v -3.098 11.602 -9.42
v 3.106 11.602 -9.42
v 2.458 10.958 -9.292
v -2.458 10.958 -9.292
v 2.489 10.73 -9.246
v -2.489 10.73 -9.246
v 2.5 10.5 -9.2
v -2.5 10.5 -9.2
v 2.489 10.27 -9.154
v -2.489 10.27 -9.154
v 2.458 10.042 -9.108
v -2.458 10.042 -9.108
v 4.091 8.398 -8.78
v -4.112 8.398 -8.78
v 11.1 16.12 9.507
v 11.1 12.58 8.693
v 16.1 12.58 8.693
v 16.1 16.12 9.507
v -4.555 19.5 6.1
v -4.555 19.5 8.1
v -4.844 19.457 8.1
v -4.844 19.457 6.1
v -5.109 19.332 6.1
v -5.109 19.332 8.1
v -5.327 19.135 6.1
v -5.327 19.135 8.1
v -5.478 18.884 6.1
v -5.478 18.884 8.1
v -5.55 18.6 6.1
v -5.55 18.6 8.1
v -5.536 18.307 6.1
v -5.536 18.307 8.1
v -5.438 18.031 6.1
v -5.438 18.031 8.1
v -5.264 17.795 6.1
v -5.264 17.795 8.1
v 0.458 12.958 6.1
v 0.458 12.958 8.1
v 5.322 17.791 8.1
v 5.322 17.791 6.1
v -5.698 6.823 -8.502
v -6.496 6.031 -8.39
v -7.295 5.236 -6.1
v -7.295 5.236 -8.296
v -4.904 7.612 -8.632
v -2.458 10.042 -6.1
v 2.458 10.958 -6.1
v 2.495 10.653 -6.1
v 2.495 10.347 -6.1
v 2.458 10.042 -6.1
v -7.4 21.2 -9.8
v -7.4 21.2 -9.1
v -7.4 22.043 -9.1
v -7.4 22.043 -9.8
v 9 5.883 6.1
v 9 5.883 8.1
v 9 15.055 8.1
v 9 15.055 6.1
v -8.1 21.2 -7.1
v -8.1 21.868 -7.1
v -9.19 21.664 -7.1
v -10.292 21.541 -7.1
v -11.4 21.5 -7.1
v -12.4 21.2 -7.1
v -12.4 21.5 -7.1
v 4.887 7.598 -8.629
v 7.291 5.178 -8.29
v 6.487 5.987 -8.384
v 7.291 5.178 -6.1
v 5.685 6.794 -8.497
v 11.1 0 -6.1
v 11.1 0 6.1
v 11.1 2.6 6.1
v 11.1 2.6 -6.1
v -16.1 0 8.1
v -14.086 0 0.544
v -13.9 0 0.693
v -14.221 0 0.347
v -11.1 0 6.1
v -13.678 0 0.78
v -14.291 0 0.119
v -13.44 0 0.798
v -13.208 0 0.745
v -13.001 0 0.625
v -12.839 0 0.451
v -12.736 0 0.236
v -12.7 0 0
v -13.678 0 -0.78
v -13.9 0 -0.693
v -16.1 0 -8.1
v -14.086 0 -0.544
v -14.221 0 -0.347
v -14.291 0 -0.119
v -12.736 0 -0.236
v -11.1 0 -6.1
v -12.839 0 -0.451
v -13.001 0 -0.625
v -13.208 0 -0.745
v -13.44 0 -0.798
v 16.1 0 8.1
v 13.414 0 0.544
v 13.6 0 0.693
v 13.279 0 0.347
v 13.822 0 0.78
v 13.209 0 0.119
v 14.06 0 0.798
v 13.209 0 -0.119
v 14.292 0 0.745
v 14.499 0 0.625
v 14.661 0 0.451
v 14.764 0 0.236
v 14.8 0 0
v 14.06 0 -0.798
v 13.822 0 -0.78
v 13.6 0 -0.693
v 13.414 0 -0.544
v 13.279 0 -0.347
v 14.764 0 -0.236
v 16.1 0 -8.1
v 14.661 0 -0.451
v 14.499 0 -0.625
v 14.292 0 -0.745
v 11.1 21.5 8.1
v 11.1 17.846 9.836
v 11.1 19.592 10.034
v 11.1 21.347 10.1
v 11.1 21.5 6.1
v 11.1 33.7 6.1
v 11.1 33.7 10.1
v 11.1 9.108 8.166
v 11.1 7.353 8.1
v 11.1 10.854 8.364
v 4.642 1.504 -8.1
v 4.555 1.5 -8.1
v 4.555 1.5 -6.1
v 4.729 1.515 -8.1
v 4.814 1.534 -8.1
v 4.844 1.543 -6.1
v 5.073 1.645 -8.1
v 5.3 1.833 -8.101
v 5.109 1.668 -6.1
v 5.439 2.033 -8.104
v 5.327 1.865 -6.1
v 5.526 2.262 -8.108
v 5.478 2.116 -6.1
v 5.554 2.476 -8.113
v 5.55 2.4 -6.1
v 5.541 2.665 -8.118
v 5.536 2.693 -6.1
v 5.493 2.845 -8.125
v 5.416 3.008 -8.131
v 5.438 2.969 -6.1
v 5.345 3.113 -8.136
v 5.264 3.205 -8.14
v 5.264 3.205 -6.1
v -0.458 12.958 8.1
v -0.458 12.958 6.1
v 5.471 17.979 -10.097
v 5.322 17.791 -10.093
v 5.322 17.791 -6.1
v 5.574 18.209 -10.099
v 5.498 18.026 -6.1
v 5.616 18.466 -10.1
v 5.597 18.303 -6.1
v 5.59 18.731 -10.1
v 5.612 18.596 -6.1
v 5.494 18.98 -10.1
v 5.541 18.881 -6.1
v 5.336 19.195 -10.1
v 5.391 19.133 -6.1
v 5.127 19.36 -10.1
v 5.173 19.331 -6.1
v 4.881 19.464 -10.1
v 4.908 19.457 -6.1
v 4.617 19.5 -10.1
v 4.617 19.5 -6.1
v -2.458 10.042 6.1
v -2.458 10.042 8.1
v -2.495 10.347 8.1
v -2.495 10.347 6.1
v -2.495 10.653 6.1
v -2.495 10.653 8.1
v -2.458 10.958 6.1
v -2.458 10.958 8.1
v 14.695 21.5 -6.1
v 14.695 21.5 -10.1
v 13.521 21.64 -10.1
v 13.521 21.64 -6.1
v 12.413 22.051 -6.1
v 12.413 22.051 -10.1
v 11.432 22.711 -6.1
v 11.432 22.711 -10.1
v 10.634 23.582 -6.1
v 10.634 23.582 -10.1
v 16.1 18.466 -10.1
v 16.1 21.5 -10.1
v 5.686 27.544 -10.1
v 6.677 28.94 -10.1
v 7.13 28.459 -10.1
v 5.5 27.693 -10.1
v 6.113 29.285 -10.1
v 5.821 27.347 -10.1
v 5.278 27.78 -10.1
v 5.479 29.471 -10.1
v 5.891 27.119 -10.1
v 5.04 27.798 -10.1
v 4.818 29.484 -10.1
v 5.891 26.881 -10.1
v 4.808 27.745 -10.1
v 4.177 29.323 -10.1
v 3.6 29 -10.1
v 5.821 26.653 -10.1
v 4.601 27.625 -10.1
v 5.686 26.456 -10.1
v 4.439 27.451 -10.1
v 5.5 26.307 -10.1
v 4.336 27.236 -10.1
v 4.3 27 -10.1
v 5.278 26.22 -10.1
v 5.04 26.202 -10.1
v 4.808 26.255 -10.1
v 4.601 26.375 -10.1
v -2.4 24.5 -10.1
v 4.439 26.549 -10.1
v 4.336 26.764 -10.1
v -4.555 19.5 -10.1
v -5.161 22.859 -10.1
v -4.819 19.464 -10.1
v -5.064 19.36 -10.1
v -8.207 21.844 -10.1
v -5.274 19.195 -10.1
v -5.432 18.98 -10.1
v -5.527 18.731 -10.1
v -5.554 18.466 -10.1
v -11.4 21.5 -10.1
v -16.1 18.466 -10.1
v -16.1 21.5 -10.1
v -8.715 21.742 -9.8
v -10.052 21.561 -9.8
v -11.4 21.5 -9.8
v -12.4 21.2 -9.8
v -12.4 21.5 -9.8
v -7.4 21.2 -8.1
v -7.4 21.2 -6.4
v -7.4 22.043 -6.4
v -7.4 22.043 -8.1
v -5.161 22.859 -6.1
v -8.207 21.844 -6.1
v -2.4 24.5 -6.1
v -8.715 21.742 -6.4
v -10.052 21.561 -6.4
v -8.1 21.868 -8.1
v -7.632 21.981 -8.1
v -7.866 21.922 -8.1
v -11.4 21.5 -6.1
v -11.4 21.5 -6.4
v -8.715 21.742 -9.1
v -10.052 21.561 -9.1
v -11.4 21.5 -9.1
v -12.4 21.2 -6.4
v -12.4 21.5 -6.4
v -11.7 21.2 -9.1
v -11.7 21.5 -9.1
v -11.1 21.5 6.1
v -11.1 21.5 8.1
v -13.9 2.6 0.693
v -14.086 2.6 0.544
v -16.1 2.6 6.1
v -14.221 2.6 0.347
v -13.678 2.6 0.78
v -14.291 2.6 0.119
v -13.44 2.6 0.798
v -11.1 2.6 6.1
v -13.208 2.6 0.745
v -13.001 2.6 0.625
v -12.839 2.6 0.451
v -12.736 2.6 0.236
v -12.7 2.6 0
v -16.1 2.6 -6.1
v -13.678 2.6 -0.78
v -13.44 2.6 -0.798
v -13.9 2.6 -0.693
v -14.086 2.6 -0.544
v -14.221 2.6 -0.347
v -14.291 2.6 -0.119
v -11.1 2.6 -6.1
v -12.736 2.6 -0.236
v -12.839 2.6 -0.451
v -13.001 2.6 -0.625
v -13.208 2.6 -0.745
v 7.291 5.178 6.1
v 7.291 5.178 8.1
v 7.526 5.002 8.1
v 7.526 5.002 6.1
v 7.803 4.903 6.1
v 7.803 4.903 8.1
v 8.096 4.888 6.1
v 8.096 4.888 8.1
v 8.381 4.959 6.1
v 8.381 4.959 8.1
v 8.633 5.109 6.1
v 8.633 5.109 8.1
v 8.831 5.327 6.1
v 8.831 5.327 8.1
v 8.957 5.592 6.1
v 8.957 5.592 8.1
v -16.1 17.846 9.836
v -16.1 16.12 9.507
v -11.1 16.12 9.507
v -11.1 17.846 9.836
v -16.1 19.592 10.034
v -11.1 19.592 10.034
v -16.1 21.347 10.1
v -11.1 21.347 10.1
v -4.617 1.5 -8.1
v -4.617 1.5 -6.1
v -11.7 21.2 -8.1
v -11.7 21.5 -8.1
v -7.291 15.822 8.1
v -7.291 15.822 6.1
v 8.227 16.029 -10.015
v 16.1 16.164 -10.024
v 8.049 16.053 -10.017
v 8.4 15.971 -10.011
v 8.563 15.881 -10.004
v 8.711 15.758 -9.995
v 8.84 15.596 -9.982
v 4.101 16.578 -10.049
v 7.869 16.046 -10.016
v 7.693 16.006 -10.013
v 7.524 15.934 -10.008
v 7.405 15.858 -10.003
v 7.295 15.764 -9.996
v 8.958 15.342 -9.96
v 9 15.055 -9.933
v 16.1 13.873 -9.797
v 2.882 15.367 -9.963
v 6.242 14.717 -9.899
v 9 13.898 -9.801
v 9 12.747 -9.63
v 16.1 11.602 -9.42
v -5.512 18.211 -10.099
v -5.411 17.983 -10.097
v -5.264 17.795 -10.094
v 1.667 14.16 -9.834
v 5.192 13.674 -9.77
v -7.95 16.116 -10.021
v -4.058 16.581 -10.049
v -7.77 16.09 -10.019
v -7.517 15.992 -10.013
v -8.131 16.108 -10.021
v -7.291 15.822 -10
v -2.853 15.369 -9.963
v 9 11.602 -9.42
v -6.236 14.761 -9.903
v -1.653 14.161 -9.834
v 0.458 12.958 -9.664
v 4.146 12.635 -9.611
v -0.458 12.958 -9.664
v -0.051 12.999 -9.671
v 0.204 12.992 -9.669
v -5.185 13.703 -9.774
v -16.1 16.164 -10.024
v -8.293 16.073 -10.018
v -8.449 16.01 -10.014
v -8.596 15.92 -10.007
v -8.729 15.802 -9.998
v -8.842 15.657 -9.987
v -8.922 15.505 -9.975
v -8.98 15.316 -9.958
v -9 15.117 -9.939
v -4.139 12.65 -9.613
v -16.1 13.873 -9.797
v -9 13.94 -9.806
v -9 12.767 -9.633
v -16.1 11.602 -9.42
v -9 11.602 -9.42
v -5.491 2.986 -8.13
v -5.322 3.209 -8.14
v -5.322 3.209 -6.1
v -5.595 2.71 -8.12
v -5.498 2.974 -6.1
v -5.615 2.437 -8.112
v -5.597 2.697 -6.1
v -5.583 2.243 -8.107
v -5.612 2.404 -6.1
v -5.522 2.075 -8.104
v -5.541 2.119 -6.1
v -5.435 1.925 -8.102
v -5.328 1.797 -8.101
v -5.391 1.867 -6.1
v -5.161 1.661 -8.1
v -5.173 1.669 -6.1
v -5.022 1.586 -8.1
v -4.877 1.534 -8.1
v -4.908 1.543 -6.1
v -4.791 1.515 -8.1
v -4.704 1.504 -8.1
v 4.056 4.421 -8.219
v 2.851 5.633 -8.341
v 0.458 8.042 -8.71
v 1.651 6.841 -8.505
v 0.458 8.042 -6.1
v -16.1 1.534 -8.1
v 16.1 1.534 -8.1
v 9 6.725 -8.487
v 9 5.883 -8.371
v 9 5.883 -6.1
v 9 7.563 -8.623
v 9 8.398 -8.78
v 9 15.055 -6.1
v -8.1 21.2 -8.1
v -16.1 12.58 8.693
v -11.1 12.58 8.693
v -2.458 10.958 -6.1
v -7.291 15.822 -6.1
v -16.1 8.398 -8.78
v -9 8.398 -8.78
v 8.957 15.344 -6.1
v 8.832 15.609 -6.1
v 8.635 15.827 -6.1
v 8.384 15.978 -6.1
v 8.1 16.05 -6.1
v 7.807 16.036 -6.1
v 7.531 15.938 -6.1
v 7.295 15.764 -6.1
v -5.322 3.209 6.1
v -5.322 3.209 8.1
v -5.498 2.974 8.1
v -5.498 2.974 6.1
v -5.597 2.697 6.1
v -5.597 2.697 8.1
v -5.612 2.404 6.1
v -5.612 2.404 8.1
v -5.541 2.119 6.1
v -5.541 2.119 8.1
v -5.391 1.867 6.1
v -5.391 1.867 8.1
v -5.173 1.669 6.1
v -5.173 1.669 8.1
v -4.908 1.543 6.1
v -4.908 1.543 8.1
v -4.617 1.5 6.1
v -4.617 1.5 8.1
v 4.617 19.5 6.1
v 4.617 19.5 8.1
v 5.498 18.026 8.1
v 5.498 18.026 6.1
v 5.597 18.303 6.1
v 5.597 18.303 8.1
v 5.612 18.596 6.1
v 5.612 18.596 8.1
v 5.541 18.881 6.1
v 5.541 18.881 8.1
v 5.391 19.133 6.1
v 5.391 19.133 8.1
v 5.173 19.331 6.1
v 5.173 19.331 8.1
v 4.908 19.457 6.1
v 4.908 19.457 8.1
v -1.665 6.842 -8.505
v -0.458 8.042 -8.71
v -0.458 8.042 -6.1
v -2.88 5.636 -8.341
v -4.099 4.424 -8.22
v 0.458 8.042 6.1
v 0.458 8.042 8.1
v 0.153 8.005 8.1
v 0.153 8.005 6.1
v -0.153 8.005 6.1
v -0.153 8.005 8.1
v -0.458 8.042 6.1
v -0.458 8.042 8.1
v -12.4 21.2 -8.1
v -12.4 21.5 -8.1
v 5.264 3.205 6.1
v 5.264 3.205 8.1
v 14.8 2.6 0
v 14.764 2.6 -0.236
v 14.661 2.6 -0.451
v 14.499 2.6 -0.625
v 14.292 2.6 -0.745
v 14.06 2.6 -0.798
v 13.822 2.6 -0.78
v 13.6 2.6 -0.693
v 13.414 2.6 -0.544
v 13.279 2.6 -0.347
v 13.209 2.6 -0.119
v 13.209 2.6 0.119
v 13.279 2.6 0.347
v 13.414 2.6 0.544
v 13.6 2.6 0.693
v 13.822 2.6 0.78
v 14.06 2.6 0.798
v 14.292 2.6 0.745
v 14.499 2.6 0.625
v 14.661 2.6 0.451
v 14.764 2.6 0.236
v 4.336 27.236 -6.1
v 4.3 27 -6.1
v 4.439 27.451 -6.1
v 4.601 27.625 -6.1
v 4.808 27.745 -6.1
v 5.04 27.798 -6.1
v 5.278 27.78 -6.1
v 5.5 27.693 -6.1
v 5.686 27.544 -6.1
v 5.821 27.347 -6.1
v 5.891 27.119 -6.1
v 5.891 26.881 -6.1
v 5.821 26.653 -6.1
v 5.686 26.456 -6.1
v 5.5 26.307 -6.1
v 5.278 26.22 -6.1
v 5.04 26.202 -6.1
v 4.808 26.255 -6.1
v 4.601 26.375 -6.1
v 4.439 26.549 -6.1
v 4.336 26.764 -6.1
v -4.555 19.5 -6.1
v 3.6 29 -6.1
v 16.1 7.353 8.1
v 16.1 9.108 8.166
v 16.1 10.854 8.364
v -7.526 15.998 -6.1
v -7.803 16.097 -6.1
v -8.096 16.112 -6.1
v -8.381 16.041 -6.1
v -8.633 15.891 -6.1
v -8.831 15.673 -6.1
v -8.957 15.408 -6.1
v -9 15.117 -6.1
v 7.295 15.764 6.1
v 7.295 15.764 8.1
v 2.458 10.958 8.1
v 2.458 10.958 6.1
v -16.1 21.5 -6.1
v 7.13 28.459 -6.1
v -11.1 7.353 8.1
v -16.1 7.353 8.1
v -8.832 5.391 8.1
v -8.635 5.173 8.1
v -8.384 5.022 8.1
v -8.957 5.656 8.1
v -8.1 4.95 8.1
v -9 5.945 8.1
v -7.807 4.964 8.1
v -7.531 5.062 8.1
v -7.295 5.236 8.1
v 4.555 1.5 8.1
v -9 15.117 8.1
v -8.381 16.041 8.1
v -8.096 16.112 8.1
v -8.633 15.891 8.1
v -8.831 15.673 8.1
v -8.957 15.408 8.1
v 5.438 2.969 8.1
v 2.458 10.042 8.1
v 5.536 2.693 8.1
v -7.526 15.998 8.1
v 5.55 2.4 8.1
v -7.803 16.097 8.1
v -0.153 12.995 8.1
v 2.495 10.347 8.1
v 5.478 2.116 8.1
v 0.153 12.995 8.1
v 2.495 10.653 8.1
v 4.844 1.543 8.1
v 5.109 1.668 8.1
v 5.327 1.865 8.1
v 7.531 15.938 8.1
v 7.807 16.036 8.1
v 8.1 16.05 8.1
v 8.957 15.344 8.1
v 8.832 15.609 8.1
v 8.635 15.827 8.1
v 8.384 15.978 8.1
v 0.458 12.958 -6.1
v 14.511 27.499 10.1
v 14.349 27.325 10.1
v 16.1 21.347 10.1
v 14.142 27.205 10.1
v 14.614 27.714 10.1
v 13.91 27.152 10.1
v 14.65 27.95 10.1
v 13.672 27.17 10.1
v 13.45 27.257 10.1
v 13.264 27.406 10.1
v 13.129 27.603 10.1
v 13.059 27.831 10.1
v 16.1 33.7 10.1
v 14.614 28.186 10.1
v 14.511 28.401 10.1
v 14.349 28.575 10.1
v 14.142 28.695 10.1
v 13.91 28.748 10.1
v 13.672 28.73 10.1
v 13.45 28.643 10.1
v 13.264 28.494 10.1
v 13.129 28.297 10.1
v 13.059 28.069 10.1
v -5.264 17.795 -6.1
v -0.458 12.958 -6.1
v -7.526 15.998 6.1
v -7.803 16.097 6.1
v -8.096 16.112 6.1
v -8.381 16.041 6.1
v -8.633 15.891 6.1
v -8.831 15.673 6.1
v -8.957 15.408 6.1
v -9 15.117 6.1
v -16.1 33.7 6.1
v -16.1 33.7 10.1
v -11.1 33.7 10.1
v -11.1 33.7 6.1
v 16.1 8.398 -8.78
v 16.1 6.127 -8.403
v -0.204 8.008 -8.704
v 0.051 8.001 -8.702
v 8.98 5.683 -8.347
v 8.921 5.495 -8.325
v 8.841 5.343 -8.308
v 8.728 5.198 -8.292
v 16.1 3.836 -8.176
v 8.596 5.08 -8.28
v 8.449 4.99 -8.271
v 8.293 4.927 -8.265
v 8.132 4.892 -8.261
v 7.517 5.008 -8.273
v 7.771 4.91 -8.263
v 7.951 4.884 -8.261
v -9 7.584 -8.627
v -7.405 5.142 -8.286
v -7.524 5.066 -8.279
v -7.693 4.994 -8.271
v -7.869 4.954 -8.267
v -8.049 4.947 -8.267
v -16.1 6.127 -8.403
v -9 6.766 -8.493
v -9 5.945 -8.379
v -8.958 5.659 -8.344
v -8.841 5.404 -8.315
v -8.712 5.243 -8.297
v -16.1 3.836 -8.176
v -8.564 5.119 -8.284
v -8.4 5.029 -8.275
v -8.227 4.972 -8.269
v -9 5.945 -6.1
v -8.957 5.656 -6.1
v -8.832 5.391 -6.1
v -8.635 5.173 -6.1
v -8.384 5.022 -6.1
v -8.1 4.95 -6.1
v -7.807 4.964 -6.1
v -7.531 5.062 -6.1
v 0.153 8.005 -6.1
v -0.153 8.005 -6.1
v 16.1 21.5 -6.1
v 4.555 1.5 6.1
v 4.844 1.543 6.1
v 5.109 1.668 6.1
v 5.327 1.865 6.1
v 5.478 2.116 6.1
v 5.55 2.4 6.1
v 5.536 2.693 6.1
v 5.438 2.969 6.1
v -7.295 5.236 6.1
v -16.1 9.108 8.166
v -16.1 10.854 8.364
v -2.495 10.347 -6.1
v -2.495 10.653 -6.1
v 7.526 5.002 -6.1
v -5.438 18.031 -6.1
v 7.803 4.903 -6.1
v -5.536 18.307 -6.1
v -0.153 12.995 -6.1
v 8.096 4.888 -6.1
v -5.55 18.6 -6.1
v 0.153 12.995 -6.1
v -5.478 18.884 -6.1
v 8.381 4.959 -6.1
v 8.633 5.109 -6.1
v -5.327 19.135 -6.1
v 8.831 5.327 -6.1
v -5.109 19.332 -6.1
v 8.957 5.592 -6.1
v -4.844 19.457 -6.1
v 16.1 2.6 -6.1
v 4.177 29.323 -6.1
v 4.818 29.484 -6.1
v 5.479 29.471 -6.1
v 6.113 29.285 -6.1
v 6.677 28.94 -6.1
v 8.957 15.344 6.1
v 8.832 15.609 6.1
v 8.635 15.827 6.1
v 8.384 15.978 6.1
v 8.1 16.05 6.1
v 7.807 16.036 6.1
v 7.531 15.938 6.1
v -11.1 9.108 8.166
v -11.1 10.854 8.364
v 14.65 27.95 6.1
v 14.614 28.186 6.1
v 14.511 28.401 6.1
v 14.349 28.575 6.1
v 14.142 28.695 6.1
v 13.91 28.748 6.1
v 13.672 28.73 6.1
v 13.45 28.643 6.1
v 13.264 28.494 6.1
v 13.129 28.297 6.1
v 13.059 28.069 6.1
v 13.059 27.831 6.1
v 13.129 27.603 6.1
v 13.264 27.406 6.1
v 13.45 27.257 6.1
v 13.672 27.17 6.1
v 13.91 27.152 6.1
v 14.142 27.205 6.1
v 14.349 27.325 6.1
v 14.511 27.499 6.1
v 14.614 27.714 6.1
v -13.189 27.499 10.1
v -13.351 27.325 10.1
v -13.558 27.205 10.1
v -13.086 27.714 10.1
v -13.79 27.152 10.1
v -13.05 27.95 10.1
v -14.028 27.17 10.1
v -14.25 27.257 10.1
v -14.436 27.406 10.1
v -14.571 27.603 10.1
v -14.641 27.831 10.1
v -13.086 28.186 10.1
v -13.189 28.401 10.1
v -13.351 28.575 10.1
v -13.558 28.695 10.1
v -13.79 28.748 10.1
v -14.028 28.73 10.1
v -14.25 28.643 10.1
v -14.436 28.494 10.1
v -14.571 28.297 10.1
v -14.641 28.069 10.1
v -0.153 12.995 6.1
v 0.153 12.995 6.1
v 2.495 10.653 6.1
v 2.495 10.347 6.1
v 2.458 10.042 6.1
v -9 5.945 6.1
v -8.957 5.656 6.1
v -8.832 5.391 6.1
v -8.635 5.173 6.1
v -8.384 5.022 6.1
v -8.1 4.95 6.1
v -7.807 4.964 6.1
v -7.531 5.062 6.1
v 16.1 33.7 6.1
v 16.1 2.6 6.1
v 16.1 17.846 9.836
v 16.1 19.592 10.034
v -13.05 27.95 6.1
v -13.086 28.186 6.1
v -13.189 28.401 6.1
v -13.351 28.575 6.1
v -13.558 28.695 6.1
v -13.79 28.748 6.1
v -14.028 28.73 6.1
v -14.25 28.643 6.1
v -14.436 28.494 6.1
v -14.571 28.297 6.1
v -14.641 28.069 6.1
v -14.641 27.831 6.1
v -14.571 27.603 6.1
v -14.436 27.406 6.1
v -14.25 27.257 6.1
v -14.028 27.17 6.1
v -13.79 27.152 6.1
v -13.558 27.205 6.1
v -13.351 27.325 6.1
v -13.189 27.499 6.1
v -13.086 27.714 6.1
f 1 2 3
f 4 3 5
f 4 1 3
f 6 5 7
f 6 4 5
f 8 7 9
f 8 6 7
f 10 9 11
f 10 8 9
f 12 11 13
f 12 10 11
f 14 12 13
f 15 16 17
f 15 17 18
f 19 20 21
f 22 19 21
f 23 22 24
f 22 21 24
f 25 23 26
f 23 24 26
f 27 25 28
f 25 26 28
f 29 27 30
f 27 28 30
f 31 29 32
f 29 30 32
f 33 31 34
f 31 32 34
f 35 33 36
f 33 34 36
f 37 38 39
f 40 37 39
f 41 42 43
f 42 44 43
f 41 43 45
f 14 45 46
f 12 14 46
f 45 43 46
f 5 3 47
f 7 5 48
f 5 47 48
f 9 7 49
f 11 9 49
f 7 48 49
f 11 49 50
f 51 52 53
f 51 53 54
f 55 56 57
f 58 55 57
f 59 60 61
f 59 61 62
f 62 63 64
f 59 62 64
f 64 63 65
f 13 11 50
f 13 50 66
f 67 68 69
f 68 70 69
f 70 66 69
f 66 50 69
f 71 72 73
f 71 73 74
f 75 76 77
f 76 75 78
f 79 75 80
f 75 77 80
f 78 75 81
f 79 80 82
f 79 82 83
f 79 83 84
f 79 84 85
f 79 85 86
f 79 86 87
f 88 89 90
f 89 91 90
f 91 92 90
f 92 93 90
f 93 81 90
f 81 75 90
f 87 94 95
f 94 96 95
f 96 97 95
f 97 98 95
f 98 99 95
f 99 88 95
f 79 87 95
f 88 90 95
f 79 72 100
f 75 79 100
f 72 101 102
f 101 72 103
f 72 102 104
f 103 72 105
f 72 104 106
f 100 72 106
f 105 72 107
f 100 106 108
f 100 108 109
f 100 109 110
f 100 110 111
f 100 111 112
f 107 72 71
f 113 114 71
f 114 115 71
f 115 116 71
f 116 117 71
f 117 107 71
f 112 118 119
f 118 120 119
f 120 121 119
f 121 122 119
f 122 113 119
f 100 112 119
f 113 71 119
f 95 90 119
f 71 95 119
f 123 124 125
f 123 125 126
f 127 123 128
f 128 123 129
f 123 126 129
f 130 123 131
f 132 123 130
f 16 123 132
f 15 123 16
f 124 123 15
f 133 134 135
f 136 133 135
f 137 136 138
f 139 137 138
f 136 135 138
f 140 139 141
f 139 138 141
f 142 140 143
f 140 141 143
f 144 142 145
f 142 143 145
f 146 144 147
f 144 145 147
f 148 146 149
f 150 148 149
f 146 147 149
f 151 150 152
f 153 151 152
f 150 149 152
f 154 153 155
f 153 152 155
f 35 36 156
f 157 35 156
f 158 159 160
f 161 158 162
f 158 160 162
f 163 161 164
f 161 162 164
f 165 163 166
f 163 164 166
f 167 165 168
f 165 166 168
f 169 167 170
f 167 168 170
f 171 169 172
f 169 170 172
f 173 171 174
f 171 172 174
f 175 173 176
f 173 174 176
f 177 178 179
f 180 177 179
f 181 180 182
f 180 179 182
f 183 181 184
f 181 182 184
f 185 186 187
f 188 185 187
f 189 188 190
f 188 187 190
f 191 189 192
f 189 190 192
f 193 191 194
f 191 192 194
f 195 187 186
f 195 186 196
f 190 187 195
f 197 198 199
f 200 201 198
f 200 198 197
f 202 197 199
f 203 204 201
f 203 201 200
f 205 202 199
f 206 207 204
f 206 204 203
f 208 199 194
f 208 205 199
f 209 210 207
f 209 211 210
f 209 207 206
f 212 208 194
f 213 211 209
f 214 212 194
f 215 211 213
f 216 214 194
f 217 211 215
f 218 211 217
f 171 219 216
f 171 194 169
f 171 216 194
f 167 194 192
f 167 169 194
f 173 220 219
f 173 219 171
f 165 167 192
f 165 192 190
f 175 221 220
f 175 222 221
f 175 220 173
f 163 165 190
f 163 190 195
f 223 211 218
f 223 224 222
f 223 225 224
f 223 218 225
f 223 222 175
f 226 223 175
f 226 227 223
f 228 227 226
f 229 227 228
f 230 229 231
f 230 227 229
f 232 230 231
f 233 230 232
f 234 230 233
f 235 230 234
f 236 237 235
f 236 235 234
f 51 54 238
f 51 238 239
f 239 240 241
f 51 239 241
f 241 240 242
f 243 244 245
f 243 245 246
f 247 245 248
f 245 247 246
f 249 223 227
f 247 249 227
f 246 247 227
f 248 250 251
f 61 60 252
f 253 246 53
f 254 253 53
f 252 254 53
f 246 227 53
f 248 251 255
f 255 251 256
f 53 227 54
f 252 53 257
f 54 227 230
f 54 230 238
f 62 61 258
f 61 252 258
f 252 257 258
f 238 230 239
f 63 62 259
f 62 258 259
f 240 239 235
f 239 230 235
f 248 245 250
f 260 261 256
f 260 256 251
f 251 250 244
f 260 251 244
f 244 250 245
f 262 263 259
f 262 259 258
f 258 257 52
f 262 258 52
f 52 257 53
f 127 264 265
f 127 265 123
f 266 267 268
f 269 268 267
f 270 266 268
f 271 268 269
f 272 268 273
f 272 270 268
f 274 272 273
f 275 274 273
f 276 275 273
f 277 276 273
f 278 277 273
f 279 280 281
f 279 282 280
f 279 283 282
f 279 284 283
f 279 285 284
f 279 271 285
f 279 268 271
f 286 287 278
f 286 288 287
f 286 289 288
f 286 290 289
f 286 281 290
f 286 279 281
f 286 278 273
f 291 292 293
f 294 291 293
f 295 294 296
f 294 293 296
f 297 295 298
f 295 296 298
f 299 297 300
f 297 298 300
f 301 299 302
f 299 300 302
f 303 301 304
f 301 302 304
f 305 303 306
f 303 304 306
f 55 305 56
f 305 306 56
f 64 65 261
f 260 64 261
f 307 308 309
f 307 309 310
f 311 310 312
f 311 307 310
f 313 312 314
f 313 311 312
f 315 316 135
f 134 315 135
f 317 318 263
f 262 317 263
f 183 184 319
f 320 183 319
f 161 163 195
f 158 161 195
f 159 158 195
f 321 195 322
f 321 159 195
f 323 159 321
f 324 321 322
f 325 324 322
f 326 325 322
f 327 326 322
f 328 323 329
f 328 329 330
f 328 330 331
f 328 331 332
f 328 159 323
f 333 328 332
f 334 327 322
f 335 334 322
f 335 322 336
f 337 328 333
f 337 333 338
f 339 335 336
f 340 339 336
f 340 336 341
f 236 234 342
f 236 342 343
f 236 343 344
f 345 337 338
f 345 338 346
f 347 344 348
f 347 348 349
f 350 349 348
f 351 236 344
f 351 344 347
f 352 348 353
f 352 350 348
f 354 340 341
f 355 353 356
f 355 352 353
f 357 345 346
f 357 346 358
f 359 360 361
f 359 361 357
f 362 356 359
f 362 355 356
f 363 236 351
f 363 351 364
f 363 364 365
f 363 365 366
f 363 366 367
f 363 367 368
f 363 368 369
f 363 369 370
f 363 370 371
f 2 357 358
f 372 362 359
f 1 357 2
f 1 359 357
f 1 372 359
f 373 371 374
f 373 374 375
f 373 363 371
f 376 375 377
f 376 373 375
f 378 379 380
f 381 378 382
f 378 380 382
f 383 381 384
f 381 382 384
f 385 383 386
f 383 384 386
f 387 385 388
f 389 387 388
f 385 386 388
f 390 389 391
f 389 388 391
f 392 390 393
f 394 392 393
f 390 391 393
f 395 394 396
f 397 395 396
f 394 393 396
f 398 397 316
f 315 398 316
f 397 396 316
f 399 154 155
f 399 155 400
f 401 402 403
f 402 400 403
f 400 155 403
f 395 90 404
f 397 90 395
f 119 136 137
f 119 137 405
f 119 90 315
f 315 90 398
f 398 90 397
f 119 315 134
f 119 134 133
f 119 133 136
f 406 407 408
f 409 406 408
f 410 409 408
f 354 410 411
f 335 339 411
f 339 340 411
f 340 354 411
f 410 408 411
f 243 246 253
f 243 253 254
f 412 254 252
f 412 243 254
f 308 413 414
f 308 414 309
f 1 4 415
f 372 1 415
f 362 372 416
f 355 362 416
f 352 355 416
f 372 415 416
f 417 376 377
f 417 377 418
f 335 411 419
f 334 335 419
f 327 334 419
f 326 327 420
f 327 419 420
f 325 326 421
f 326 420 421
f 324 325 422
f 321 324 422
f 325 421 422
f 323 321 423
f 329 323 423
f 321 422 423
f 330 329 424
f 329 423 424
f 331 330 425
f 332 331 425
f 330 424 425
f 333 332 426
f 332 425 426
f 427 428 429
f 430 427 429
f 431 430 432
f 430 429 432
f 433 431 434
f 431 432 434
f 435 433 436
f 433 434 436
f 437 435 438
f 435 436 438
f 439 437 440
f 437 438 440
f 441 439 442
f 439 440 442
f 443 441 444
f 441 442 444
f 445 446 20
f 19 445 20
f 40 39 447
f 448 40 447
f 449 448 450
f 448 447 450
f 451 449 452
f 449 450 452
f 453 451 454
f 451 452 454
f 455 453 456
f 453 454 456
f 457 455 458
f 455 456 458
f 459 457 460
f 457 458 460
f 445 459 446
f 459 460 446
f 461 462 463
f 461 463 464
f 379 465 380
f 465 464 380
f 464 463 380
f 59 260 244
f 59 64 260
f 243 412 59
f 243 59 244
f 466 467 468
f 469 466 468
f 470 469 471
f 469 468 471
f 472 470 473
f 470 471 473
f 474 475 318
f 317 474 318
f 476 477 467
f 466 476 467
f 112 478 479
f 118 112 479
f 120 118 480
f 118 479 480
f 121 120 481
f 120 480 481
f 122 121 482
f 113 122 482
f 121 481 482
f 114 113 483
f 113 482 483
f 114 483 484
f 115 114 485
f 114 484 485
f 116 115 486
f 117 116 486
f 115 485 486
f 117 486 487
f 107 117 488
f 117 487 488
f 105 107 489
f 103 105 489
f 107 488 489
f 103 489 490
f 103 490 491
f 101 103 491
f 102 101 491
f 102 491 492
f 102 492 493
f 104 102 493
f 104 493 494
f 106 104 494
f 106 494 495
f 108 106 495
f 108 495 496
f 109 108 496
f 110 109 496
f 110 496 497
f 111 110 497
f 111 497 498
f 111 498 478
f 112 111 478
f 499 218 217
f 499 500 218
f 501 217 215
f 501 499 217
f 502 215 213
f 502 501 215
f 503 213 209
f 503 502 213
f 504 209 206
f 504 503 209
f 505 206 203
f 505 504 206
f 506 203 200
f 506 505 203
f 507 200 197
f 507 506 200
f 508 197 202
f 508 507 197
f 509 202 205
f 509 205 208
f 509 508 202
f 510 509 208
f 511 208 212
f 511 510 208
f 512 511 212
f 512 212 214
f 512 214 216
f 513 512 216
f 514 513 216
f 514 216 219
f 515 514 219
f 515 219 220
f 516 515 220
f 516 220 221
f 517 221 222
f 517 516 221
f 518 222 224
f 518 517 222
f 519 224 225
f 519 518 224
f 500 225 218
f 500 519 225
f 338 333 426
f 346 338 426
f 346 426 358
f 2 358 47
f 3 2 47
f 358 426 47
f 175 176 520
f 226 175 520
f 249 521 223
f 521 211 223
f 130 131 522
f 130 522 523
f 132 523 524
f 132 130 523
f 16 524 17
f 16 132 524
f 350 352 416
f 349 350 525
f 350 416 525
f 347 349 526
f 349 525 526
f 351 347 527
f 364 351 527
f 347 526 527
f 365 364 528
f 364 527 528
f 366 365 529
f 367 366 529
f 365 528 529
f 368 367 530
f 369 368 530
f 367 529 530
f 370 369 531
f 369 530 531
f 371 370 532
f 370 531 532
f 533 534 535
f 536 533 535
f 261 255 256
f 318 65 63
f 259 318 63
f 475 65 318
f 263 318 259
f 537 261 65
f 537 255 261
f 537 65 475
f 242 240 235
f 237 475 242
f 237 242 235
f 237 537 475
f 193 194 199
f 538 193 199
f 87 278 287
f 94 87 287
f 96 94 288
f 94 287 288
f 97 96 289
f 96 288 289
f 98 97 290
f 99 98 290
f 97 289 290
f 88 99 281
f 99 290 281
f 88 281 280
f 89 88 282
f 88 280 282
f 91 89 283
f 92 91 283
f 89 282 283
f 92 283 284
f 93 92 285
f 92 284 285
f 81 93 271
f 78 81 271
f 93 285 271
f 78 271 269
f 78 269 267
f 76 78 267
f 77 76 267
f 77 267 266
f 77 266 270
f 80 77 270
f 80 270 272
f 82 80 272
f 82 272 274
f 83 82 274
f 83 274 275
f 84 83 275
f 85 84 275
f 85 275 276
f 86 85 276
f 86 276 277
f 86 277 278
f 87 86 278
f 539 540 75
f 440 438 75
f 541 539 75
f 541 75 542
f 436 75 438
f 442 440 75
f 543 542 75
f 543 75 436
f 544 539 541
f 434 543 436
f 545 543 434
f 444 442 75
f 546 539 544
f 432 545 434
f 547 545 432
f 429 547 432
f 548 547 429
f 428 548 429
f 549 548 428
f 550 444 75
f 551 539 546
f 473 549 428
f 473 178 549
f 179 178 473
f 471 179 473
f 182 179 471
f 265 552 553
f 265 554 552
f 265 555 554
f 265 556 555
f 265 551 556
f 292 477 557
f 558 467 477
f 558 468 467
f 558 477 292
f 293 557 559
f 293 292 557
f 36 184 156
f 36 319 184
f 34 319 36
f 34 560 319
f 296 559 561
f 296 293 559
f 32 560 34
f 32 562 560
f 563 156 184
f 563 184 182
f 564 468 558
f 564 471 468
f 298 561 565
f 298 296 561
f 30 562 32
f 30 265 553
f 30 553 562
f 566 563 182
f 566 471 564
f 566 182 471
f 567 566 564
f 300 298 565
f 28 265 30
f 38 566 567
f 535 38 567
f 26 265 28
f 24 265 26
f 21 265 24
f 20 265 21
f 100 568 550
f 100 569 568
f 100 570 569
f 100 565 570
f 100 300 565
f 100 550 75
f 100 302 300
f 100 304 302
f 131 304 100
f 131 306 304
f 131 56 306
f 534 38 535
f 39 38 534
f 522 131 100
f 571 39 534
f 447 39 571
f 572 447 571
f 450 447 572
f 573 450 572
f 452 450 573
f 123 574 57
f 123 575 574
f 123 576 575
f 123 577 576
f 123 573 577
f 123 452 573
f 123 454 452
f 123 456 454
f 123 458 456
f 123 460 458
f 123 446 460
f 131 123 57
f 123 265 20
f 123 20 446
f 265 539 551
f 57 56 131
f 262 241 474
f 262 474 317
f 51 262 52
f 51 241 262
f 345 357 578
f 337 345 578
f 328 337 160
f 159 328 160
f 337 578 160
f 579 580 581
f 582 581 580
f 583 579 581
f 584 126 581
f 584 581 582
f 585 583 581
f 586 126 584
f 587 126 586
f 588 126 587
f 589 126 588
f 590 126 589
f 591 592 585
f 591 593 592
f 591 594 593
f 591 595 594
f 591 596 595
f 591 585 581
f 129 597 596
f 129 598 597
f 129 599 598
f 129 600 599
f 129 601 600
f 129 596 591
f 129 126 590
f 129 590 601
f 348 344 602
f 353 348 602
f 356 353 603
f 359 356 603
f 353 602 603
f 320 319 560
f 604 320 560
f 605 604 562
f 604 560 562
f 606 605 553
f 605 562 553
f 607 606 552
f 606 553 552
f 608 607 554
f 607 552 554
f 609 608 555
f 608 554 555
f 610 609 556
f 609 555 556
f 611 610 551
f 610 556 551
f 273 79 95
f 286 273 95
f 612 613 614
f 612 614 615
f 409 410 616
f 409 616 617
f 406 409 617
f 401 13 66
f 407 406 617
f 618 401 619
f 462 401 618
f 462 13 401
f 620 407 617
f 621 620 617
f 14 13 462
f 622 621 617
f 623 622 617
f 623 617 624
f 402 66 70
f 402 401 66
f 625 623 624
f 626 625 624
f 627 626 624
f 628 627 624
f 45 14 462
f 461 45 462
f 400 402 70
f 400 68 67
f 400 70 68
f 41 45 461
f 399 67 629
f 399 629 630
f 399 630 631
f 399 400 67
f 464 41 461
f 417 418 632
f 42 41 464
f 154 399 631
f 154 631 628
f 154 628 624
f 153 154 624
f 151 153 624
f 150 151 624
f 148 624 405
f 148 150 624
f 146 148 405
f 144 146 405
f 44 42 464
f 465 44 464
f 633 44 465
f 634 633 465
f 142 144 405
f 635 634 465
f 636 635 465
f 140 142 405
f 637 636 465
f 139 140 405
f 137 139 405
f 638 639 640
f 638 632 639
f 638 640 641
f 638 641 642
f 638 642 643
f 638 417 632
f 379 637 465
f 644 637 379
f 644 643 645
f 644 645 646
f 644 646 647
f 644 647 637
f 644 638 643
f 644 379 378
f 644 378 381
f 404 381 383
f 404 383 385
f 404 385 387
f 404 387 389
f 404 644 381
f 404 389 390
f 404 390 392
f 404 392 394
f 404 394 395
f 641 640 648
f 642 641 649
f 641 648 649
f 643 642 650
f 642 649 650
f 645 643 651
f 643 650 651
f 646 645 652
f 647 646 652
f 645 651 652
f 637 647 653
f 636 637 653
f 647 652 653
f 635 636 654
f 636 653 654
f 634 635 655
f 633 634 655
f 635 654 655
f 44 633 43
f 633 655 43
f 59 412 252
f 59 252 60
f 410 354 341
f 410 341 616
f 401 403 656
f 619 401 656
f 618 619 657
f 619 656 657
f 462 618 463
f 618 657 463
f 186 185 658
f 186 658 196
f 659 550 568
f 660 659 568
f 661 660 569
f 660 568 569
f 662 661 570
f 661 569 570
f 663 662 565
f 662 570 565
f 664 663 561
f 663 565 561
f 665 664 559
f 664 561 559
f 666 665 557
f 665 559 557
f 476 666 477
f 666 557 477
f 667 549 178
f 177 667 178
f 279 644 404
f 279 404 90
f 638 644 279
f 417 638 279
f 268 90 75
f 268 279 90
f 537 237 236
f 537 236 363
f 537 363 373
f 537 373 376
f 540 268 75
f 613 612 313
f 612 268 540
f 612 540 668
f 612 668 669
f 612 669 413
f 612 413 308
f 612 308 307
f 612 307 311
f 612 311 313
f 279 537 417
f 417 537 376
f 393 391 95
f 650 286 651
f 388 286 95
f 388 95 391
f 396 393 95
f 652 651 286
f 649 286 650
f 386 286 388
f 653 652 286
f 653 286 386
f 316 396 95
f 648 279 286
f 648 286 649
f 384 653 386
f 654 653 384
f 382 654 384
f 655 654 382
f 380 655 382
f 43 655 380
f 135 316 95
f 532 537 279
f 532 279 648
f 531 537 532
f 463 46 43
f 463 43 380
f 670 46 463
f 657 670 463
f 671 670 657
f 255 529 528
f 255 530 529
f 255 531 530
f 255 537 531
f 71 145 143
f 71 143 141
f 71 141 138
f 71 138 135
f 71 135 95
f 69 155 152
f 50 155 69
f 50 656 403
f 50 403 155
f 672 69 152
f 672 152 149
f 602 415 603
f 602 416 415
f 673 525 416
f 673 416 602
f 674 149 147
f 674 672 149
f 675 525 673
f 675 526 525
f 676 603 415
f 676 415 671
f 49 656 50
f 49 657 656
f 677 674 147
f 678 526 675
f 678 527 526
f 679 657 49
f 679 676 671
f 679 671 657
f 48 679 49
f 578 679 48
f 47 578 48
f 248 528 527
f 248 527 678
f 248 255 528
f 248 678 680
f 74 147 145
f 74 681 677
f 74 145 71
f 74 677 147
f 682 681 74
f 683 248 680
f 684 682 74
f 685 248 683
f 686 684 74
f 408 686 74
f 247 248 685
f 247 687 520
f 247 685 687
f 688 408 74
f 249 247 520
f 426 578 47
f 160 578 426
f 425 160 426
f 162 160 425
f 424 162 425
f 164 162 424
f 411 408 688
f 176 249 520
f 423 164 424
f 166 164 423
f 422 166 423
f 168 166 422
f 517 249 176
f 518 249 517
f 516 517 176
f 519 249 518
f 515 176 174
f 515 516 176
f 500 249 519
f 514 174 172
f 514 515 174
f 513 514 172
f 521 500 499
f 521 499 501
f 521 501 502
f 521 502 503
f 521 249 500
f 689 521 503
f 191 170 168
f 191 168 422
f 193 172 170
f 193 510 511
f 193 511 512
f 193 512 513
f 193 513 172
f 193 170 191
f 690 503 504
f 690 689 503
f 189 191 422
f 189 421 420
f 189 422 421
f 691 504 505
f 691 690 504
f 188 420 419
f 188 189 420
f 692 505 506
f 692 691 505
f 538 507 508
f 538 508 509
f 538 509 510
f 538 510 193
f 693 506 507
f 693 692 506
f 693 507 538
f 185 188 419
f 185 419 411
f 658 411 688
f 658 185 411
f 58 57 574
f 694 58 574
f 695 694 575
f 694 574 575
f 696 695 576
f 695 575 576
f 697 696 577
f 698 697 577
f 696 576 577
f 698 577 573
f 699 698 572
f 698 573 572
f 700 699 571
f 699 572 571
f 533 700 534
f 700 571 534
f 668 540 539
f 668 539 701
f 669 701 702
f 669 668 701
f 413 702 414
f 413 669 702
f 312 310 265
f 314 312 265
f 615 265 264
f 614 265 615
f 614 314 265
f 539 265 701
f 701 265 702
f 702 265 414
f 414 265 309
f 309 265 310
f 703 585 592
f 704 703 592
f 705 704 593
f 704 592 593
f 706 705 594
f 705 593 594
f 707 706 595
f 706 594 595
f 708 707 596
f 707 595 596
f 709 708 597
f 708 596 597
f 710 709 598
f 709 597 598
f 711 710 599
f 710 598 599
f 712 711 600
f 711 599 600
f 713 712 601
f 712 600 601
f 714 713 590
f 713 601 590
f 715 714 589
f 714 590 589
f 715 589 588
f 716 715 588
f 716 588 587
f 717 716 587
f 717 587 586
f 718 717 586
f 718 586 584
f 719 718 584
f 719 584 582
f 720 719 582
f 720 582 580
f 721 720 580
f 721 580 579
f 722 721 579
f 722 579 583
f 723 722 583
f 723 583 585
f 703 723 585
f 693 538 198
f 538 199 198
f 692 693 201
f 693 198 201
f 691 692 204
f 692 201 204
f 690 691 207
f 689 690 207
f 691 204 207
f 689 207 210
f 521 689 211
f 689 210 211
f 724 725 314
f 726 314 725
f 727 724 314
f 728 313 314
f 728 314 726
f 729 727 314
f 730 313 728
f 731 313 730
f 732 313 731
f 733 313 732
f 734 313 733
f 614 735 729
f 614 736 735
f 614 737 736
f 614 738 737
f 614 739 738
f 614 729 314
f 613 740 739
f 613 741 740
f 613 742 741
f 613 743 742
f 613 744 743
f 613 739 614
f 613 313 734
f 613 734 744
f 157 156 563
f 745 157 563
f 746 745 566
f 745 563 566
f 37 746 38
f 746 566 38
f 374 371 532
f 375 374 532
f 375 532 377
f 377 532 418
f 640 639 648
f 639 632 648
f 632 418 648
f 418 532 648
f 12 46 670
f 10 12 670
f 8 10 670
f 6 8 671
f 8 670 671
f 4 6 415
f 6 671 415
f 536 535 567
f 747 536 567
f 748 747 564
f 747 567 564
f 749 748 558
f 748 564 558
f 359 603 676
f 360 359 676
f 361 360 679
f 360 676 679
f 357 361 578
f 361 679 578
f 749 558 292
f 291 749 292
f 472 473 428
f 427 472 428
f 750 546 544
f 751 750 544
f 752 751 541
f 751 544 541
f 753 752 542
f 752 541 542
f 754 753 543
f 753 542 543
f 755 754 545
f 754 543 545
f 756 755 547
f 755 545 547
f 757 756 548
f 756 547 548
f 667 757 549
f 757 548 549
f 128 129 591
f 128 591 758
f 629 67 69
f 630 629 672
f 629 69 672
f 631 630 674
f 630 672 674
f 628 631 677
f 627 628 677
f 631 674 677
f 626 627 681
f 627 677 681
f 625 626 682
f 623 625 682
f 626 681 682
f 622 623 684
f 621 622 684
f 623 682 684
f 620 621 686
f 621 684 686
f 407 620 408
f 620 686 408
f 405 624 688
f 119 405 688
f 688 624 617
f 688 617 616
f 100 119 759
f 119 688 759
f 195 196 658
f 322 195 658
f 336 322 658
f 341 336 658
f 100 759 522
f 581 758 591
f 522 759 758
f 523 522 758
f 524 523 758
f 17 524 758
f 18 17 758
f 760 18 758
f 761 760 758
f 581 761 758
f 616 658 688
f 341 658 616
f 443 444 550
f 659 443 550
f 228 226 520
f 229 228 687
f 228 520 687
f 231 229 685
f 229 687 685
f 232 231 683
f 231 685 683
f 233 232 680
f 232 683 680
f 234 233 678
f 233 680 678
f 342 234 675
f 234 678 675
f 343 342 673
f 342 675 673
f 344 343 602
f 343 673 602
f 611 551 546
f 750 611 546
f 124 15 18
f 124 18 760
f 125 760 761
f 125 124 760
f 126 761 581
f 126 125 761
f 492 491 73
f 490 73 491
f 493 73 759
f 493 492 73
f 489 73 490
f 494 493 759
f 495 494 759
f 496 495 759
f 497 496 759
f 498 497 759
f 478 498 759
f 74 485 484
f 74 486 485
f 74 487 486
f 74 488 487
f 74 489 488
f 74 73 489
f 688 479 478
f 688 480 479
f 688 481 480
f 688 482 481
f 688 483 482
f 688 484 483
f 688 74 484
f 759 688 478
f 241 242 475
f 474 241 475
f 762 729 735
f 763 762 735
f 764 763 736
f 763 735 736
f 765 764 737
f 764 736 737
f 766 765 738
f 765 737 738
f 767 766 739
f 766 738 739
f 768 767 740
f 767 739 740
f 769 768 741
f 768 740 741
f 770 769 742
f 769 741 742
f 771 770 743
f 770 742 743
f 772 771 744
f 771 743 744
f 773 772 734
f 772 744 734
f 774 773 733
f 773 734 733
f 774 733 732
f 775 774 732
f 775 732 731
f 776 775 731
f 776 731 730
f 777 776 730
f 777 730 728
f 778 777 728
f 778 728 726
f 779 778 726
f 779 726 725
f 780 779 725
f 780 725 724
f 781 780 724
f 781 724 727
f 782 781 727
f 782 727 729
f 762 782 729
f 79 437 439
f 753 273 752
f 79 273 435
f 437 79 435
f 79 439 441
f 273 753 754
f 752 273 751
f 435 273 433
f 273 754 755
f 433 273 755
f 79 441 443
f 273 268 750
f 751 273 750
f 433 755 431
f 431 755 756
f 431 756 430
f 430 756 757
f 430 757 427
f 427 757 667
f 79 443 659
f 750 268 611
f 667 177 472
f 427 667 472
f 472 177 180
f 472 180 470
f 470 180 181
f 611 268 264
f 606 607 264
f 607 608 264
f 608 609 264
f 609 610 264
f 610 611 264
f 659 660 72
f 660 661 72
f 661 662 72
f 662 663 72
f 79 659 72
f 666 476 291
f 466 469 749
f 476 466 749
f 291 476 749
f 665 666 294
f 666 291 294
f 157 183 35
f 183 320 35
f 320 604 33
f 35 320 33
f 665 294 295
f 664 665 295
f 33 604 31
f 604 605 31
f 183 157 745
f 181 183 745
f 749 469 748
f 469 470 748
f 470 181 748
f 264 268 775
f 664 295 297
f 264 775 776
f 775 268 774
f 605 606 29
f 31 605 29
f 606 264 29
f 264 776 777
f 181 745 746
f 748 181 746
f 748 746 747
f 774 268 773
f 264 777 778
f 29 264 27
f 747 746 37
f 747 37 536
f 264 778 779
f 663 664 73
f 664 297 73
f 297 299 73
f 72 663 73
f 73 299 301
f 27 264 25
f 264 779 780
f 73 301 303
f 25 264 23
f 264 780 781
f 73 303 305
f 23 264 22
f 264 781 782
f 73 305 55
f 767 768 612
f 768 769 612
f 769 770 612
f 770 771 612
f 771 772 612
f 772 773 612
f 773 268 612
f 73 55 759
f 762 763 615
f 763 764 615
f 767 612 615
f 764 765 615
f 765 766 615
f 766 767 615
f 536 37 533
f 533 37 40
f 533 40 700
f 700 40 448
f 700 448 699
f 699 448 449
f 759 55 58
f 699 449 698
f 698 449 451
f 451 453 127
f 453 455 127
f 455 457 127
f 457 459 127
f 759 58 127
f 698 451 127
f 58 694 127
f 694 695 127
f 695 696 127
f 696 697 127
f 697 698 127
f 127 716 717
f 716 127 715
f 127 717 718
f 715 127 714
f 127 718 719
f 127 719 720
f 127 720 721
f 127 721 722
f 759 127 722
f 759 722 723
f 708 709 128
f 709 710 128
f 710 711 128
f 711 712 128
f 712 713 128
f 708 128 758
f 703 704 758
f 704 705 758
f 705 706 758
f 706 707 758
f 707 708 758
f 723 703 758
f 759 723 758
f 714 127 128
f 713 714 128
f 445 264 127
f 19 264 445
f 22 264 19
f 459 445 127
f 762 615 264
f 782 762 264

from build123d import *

# Parameters (mm, degrees)
CROQUIS1_W                        = 5
CROQUIS1_H                        = 16.2
SALIENTE_EXTRUIR1_DEPTH           = 3
SALIENTE_EXTRUIR1_2_DEPTH         = 3
CROQUIS2_R                        = 0.8
CORTAR_EXTRUIR2_DEPTH             = 3
CROQUIS4_W                        = 32.2
CROQUIS4_H                        = 2
SALIENTE_EXTRUIR2_DEPTH           = 18.5
SALIENTE_EXTRUIR2_DEPTH_BACK      = 3
CROQUIS5_W                        = 5
CROQUIS5_H                        = 12.2
SALIENTE_EXTRUIR3_DEPTH           = 2
SALIENTE_EXTRUIR4_DEPTH           = 32.2
CORTAR_EXTRUIR3_REACH             = 35.7
CROQUIS8_W                        = 22.2
CROQUIS8_H                        = 2
CORTAR_EXTRUIR3_DIRECTION_2_DEPTH = 1
CORTAR_EXTRUIR4_REACH             = 20.2
CROQUIS9_R                        = 0.8
CROQUIS10_R                       = 0.8
SALIENTE_EXTRUIR5_DEPTH           = 2
SALIENTE_EXTRUIR7_DEPTH           = 32.2
CORTAR_EXTRUIR5_DEPTH             = 19.2
CORTAR_EXTRUIR9_DEPTH             = 0.3
CORTAR_EXTRUIR9_DIRECTION_2_REACH = 14.2
CROQUIS21_W                       = 32.2
CROQUIS21_H                       = 12.2
CORTAR_EXTRUIR10_DEPTH            = 0.4


with BuildPart() as part:
    # Croquis1 → Saliente-Extruir1 (new body)
    with BuildSketch(Plane(origin=(0, 0, 0), x_dir=(1, 0, 0), z_dir=(0, 1, 0))):
        with Locations((-13.6, 0)):
            Rectangle(CROQUIS1_W, CROQUIS1_H)
    extrude(amount=SALIENTE_EXTRUIR1_DEPTH)


with BuildPart() as body_2:
    # Croquis1 → Saliente-Extruir1 2 (new body)
    with BuildSketch(Plane(origin=(0, 0, 0), x_dir=(1, 0, 0), z_dir=(0, 1, 0))):
        with Locations((13.6, 0)):
            Rectangle(CROQUIS1_W, CROQUIS1_H)
    extrude(amount=SALIENTE_EXTRUIR1_2_DEPTH)


with BuildPart() as cortar_extruir2_tool:
    # Croquis2 → Cortar-Extruir2 (new body)
    with BuildSketch(Plane(origin=(0, 3, 0), x_dir=(1, 0, 0), z_dir=(0, 1, 0))):
        with Locations((-13.5, 0)):
            Circle(CROQUIS2_R)
        with Locations((14, 0)):
            Circle(CROQUIS2_R)
    extrude(amount=-CORTAR_EXTRUIR2_DEPTH)


with BuildPart() as part_1:
    add(part.part)

    # Cortar-Extruir2: cut by cortar_extruir2_tool
    add(cortar_extruir2_tool.part, mode=Mode.SUBTRACT)



with BuildPart() as body_2_1:
    add(body_2.part)

    # Cortar-Extruir2: cut by cortar_extruir2_tool
    add(cortar_extruir2_tool.part, mode=Mode.SUBTRACT)


with BuildPart() as part_2:
    add(part_1.part)

    add(body_2_1.part)  # Saliente-Extruir2 merges body 2
    # Croquis4 → Saliente-Extruir2 (add, two sides)
    with BuildSketch(Plane(origin=(0, 3, 0), x_dir=(1, 0, 0), z_dir=(0, 1, 0))) as saliente_extruir2_sk:
        with Locations((0, 7.1)):
            Rectangle(CROQUIS4_W, CROQUIS4_H)
        with Locations((0, -7.1)):
            Rectangle(CROQUIS4_W, CROQUIS4_H)
    extrude(amount=SALIENTE_EXTRUIR2_DEPTH)
    extrude(saliente_extruir2_sk.sketch, amount=-SALIENTE_EXTRUIR2_DEPTH_BACK)

    # Croquis5 → Saliente-Extruir3 (add)
    with BuildSketch(Plane.XY.offset(8.1)):
        with Locations((13.6, 27.6)):
            Rectangle(CROQUIS5_W, CROQUIS5_H)
        with Locations((-13.6, 27.6)):
            Rectangle(CROQUIS5_W, CROQUIS5_H)
    extrude(amount=-SALIENTE_EXTRUIR3_DEPTH)

    # Croquis7 → Saliente-Extruir4 (add, through all)
    with BuildSketch(Plane.ZY.offset(16.1)):
        with BuildLine():
            Line((10.1, 33.7), (8.1, 33.7))
            Line((8.1, 33.7), (8.1, 7.353005636))
            ThreePointArc((8.1, 7.353005636), (8.248733131, 9.983124325), (8.693036056, 12.579706844))
            Line((8.693036056, 12.579706844), (9.506963944, 16.120293156))
            ThreePointArc((9.506963944, 16.120293156), (9.951266869, 18.716875675), (10.1, 21.346994364))
            Line((10.1, 21.346994364), (10.1, 33.7))
        make_face()
    extrude(amount=-SALIENTE_EXTRUIR4_DEPTH)

    # Croquis8 → Cortar-Extruir3 (cut, up to next)
    with BuildSketch(Plane(origin=(0, 33.7, 0), x_dir=(1, 0, 0), z_dir=(0, 1, 0)), mode=Mode.PRIVATE) as cortar_extruir3_sk1:
        with Locations((0, -9.1)):
            Rectangle(CROQUIS8_W, CROQUIS8_H)
    cortar_extruir3_tool1 = extrude(cortar_extruir3_sk1.sketch, amount=-CORTAR_EXTRUIR3_REACH, mode=Mode.PRIVATE) & part_2.part
    add(cortar_extruir3_tool1.solids().sort_by_distance((0, 33.7, 9.1))[0], mode=Mode.SUBTRACT)

    # Croquis8 → Cortar-Extruir3 direction 2 (cut)
    with BuildSketch(Plane(origin=(0, 33.7, 0), x_dir=(1, 0, 0), z_dir=(0, 1, 0))):
        with Locations((0, -9.1)):
            Rectangle(CROQUIS8_W, CROQUIS8_H)
    extrude(amount=CORTAR_EXTRUIR3_DIRECTION_2_DEPTH, mode=Mode.SUBTRACT)

    # Croquis9 → Cortar-Extruir4 (cut, up to next)
    with BuildSketch(Plane.XY.offset(10.1), mode=Mode.PRIVATE) as cortar_extruir4_sk1:
        with Locations((-13.85, 27.95)):
            Circle(CROQUIS9_R)
    cortar_extruir4_tool1 = extrude(cortar_extruir4_sk1.sketch, amount=-CORTAR_EXTRUIR4_REACH, mode=Mode.PRIVATE) & part_2.part
    add(cortar_extruir4_tool1.solids().sort_by_distance((-13.85, 27.95, 10.1))[0], mode=Mode.SUBTRACT)
    # Croquis9 → Cortar-Extruir4 (cut, up to next)
    with BuildSketch(Plane.XY.offset(10.1), mode=Mode.PRIVATE) as cortar_extruir4_sk2:
        with Locations((13.85, 27.95)):
            Circle(CROQUIS9_R)
    cortar_extruir4_tool2 = extrude(cortar_extruir4_sk2.sketch, amount=-CORTAR_EXTRUIR4_REACH, mode=Mode.PRIVATE) & part_2.part
    add(cortar_extruir4_tool2.solids().sort_by_distance((13.85, 27.95, 10.1))[0], mode=Mode.SUBTRACT)

    # Croquis10 → Saliente-Extruir5 (add, symmetric)
    with BuildSketch(Plane(origin=(0, 0, -8.1), x_dir=(-1, 0, 0), z_dir=(0, 0, -1))):
        with BuildLine():
            Line((-10.633991508, 23.582443769), (-7.130262645, 28.458778116))
            ThreePointArc((-7.130262645, 28.458778116), (-5.478846803, 29.471128305), (-3.6, 29))
            Line((-3.6, 29), (2.4, 24.5))
            ThreePointArc((2.4, 24.5), (6.65658351, 22.269750529), (11.4, 21.5))
            Line((11.4, 21.5), (-14.694516799, 21.5))
            ThreePointArc((-14.694516799, 21.5), (-12.412826763, 22.050967456), (-10.633991508, 23.582443769))
        make_face()
        with Locations((-5.1, 27)):
            Circle(CROQUIS10_R, mode=Mode.SUBTRACT)
    extrude(amount=SALIENTE_EXTRUIR5_DEPTH, both=True)

    # Croquis13 → Saliente-Extruir7 (add, through all)
    with BuildSketch(Plane.ZY.offset(16.1)):
        with BuildLine():
            Line((-8.1, 21.5), (-10.1, 21.5))
            Line((-10.1, 21.5), (-10.1, 18.465682976))
            ThreePointArc((-10.1, 18.465682976), (-9.929666433, 15.016866347), (-9.420323649, 11.601618246))
            Line((-9.420323649, 11.601618246), (-8.779676351, 8.398381754))
            ThreePointArc((-8.779676351, 8.398381754), (-8.270333567, 4.983133653), (-8.1, 1.534317024))
            Line((-8.1, 1.534317024), (-8.1, 21.5))
        make_face()
    extrude(amount=-SALIENTE_EXTRUIR7_DEPTH)

    # Croquis14 → Cortar-Extruir5 (cut, through all)
    with BuildSketch(Plane.XY.offset(8.1)):
        with BuildLine():
            Line((-9, 15.116941663), (-9, 5.945455337))
            ThreePointArc((-9, 5.945455337), (-8.38417979, 5.022197037), (-7.295188221, 5.236060978))
            Line((-7.295188221, 5.236060978), (-2.457737974, 10.042262026))
            ThreePointArc((-2.457737974, 10.042262026), (-2.499999997, 10.499882305), (-2.457781062, 10.95750656))
            Line((-2.457781062, 10.95750656), (-7.290605641, 15.821753441))
            ThreePointArc((-7.290605641, 15.821753441), (-8.381186071, 16.041440002), (-9, 15.116941663))
        make_face()
        with BuildLine():
            Line((-5.263939022, 17.795188221), (-0.457737974, 12.957737974))
            ThreePointArc((-0.457737974, 12.957737974), (-0.000117695, 12.999999997), (0.45750656, 12.957781062))
            Line((0.45750656, 12.957781062), (5.321753441, 17.790605641))
            ThreePointArc((5.321753441, 17.790605641), (5.541440002, 18.881186071), (4.616941663, 19.5))
            Line((4.616941663, 19.5), (-4.554544663, 19.5))
            ThreePointArc((-4.554544663, 19.5), (-5.477802963, 18.88417979), (-5.263939022, 17.795188221))
        make_face()
        with BuildLine():
            Line((7.295188221, 15.763939022), (2.457737974, 10.957737974))
            ThreePointArc((2.457737974, 10.957737974), (2.499999997, 10.500117695), (2.457781062, 10.04249344))
            Line((2.457781062, 10.04249344), (7.290605641, 5.178246559))
            ThreePointArc((7.290605641, 5.178246559), (8.381186071, 4.958559998), (9, 5.883058337))
            Line((9, 5.883058337), (9, 15.054544663))
            ThreePointArc((9, 15.054544663), (8.38417979, 15.977802963), (7.295188221, 15.763939022))
        make_face()
        with BuildLine():
            Line((5.263939022, 3.204811779), (0.457737974, 8.042262026))
            ThreePointArc((0.457737974, 8.042262026), (0.000117695, 8.000000003), (-0.45750656, 8.042218938))
            Line((-0.45750656, 8.042218938), (-5.321753441, 3.209394359))
            ThreePointArc((-5.321753441, 3.209394359), (-5.541440002, 2.118813929), (-4.616941663, 1.5))
            Line((-4.616941663, 1.5), (4.554544663, 1.5))
            ThreePointArc((4.554544663, 1.5), (5.477802963, 2.11582021), (5.263939022, 3.204811779))
        make_face()
    extrude(amount=-CORTAR_EXTRUIR5_DEPTH, mode=Mode.SUBTRACT)

    # Croquis20 → Cortar-Extruir9 (cut)
    with BuildSketch(Plane(origin=(0, 21.5, 0), x_dir=(1, 0, 0), z_dir=(0, 1, 0))):
        Polygon((-12.4, 6.4), (-7.4, 6.4), (-7.4, 8.1), (-8.1, 8.1), (-8.1, 7.1), (-12.4, 7.1), align=None)
        Polygon((-7.4, 9.1), (-7.4, 9.8), (-12.4, 9.8), (-12.4, 8.1), (-11.7, 8.1), (-11.7, 9.1), align=None)
    extrude(amount=-CORTAR_EXTRUIR9_DEPTH, mode=Mode.SUBTRACT)

    # Croquis20 → Cortar-Extruir9 direction 2 (cut, up to next)
    with BuildSketch(Plane(origin=(0, 21.5, 0), x_dir=(1, 0, 0), z_dir=(0, 1, 0)), mode=Mode.PRIVATE) as cortar_extruir9_direction_2_sk1:
        Polygon((-12.4, 6.4), (-7.4, 6.4), (-7.4, 8.1), (-8.1, 8.1), (-8.1, 7.1), (-12.4, 7.1), align=None)
    cortar_extruir9_direction_2_tool1 = extrude(cortar_extruir9_direction_2_sk1.sketch, amount=CORTAR_EXTRUIR9_DIRECTION_2_REACH, mode=Mode.PRIVATE) & part_2.part
    add(cortar_extruir9_direction_2_tool1.solids().sort_by_distance((-9.541667, 21.5, -6.891667))[0], mode=Mode.SUBTRACT)
    # Croquis20 → Cortar-Extruir9 direction 2 (cut, up to next)
    with BuildSketch(Plane(origin=(0, 21.5, 0), x_dir=(1, 0, 0), z_dir=(0, 1, 0)), mode=Mode.PRIVATE) as cortar_extruir9_direction_2_sk2:
        Polygon((-7.4, 9.1), (-7.4, 9.8), (-12.4, 9.8), (-12.4, 8.1), (-11.7, 8.1), (-11.7, 9.1), align=None)
    cortar_extruir9_direction_2_tool2 = extrude(cortar_extruir9_direction_2_sk2.sketch, amount=CORTAR_EXTRUIR9_DIRECTION_2_REACH, mode=Mode.PRIVATE) & part_2.part
    add(cortar_extruir9_direction_2_tool2.solids().sort_by_distance((-10.258333, 21.5, -9.308333))[0], mode=Mode.SUBTRACT)

    # Croquis21 → Cortar-Extruir10 (cut)
    with BuildSketch(Plane(origin=(0, 3, 0), x_dir=(1, 0, 0), z_dir=(0, 1, 0))):
        Rectangle(CROQUIS21_W, CROQUIS21_H)
    extrude(amount=-CORTAR_EXTRUIR10_DEPTH, mode=Mode.SUBTRACT)


solid = part_2.part
